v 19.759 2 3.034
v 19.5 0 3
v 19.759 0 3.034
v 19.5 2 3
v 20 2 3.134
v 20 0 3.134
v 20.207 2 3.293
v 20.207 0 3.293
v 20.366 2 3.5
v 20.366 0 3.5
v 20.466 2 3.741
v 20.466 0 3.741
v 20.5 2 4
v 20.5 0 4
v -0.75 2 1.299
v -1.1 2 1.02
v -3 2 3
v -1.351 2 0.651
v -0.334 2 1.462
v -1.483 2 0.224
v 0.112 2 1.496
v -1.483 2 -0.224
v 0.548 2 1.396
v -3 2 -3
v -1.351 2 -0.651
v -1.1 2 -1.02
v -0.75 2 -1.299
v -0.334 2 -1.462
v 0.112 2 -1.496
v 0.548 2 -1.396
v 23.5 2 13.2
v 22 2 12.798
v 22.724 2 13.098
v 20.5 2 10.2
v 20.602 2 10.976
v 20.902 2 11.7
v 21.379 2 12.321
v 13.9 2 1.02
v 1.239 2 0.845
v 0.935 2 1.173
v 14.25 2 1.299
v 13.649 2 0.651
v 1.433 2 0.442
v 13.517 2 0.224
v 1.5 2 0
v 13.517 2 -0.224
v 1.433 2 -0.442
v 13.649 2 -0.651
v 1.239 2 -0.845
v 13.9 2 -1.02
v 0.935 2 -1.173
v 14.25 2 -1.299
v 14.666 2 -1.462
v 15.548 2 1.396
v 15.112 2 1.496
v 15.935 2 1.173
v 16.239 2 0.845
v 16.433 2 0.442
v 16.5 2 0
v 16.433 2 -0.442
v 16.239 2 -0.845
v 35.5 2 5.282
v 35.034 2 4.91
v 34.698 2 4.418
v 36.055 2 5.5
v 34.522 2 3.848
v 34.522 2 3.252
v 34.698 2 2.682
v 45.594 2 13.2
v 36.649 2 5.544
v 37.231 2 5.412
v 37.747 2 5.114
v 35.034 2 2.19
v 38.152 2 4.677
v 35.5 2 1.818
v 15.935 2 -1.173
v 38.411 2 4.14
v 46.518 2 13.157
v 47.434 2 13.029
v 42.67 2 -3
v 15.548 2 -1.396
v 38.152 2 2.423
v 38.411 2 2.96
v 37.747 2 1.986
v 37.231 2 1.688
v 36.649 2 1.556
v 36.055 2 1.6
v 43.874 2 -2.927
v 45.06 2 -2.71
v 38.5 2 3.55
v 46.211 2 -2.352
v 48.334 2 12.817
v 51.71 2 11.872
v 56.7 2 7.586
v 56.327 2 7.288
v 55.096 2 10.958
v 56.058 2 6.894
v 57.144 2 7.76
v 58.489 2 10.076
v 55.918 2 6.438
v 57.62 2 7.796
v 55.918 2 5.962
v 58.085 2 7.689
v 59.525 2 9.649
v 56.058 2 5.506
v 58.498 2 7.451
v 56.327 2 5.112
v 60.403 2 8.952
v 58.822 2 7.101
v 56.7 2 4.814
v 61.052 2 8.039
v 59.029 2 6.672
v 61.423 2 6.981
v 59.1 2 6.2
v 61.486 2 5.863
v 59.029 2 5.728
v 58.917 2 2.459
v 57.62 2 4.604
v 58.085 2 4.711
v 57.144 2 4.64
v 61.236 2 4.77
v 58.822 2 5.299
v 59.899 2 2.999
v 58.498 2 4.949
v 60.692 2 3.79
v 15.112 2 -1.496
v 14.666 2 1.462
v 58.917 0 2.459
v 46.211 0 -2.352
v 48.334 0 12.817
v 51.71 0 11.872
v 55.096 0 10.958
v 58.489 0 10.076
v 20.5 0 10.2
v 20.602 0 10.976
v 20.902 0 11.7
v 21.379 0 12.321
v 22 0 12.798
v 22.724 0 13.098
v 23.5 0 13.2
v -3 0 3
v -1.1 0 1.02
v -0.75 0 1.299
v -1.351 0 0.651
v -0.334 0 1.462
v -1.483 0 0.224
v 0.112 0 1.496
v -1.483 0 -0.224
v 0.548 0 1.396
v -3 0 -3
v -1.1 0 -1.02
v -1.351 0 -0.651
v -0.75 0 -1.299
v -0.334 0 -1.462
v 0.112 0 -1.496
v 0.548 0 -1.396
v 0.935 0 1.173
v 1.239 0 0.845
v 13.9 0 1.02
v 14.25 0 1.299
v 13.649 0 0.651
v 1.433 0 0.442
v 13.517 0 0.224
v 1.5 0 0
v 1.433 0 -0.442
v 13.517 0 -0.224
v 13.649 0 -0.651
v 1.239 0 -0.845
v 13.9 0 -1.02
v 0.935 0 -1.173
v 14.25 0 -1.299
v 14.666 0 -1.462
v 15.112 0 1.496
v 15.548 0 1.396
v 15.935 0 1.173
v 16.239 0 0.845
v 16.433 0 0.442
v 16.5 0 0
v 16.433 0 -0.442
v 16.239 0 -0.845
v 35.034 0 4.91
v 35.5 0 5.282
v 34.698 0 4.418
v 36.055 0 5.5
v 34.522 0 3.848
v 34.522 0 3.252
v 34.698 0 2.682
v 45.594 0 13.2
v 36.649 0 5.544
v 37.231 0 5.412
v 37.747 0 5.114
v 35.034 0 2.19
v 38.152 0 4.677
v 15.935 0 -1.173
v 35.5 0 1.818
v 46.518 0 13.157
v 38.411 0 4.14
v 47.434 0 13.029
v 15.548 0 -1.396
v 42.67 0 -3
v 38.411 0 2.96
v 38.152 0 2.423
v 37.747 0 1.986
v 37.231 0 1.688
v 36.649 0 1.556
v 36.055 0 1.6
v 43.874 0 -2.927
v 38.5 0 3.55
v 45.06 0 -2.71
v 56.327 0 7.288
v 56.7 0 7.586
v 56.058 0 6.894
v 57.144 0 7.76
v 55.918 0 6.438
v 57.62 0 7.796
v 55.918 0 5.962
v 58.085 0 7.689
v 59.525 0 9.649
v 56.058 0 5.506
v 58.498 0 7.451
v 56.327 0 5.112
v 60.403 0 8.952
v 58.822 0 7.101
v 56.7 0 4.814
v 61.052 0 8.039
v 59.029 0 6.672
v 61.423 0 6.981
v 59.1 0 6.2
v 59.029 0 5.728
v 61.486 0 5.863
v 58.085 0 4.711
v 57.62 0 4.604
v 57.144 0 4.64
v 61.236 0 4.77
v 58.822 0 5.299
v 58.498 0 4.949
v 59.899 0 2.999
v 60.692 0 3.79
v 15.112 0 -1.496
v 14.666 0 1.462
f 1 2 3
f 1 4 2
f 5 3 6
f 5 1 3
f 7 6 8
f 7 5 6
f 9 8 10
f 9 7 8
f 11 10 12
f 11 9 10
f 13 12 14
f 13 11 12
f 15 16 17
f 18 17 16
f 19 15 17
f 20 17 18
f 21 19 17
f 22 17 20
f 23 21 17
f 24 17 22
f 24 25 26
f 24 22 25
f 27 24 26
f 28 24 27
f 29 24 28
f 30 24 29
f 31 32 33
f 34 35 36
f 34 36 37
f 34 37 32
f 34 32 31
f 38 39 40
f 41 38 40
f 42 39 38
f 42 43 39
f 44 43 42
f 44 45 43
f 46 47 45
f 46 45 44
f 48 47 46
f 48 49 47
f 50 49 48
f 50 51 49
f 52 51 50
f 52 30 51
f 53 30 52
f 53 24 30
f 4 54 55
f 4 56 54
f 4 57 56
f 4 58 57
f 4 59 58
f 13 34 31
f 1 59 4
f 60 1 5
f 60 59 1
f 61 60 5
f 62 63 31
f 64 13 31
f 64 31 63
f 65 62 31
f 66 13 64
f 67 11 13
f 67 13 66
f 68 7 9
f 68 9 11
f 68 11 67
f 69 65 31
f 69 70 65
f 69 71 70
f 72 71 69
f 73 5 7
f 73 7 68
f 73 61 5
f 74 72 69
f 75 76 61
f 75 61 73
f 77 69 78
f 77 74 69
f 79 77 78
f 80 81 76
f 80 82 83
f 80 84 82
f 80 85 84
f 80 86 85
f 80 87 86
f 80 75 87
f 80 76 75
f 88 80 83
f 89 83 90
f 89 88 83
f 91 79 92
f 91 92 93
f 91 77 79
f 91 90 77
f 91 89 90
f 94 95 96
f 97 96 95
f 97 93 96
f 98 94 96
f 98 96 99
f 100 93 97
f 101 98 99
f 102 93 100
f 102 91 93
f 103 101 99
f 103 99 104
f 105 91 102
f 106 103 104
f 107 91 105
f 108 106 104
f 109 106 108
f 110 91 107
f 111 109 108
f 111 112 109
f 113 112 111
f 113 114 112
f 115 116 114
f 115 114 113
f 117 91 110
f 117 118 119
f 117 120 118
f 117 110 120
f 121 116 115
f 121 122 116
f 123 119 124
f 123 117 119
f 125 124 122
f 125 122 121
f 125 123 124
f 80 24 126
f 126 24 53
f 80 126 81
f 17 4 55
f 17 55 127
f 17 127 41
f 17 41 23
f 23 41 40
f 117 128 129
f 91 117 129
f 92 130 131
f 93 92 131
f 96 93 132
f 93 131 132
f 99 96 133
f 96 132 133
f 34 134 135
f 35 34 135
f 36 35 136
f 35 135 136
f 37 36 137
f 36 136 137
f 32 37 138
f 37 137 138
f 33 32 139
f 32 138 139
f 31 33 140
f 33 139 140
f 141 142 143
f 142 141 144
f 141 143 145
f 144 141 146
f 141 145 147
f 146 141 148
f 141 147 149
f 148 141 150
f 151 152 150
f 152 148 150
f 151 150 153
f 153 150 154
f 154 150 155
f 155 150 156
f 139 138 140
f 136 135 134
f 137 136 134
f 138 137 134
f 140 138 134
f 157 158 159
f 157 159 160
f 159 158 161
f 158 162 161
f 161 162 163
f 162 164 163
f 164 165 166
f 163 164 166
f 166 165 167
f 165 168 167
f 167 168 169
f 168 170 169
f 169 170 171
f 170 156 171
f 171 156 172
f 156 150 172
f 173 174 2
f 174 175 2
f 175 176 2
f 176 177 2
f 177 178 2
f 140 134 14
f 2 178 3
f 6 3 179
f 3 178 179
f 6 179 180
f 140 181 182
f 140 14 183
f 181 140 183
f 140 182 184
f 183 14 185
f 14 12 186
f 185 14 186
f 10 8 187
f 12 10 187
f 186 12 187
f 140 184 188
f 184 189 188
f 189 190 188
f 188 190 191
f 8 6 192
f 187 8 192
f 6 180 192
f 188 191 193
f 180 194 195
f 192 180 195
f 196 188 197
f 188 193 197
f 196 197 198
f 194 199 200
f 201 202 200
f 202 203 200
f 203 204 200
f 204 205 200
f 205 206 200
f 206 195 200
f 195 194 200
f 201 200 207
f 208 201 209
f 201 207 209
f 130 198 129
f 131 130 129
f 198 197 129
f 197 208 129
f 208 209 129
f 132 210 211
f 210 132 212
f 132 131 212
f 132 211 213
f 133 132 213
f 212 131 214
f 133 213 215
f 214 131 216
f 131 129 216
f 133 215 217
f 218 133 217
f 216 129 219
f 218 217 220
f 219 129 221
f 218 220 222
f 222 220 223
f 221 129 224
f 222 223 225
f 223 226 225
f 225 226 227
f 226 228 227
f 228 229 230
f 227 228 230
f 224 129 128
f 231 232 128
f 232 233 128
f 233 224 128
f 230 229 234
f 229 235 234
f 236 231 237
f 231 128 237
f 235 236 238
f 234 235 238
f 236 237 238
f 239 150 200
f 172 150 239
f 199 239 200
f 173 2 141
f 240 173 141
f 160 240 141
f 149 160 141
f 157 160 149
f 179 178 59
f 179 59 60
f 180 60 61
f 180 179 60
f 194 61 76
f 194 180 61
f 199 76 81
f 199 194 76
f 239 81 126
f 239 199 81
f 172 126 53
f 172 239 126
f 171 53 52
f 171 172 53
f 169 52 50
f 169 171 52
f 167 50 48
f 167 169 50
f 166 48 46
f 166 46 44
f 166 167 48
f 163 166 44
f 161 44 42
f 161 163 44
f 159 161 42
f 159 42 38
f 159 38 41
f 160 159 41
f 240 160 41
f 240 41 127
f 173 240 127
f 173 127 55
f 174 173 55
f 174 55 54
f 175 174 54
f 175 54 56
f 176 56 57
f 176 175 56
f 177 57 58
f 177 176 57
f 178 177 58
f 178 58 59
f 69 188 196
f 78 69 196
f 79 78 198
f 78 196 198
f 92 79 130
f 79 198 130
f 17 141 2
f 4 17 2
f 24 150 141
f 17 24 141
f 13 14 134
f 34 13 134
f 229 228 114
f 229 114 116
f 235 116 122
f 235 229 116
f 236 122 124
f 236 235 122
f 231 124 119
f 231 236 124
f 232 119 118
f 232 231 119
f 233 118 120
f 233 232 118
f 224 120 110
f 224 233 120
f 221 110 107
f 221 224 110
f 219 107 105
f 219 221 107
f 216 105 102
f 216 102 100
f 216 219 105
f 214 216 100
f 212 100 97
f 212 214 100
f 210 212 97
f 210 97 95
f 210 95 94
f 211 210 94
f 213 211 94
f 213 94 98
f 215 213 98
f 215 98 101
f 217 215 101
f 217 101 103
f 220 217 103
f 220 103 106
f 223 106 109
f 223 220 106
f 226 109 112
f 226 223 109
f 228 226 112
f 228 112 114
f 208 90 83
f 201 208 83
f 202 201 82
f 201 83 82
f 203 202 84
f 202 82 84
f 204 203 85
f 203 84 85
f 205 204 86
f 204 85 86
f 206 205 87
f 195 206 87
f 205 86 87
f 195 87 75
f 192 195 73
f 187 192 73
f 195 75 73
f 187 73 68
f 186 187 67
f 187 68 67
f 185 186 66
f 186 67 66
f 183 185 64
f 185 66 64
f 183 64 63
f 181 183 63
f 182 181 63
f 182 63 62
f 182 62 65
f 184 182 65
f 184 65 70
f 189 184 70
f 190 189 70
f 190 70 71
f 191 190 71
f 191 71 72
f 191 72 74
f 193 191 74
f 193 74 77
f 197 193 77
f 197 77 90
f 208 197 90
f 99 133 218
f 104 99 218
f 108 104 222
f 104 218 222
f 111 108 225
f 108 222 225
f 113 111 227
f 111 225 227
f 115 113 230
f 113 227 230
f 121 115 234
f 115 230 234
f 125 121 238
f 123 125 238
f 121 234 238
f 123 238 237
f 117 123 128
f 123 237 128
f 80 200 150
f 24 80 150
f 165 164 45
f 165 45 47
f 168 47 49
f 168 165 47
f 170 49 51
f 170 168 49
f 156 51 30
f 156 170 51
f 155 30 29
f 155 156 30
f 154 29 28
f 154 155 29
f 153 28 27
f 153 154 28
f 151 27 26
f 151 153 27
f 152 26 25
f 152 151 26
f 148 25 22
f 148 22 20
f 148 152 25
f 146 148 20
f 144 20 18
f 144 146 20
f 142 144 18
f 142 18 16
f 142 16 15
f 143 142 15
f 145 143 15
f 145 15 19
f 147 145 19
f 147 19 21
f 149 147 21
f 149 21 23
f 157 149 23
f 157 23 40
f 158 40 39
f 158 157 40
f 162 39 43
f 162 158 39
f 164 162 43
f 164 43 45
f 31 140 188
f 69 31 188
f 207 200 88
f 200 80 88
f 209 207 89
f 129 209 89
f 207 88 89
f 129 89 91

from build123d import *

# Parameters (mm, degrees)
SKETCH_2_R          = 1.5
SKETCH_2_R_2        = 1.6
EXTRUDE_2_DEPTH     = 2
FILLET_1_R          = 1
FILLET_2_R          = 10
SKETCH_3_R          = 2
CUT_EXTRUDE_1_DEPTH = 3


with BuildPart() as part:
    # 草图2 → 凸台-拉伸2 (new body)
    with BuildSketch(Plane(origin=(0, 0, 0), x_dir=(1, 0, 0), z_dir=(0, 1, 0))):
        with BuildLine():
            Line((44.5, 3), (-3, 3))
            Line((-3, 3), (-3, -3))
            Line((-3, -3), (20.5, -3))
            Line((20.5, -3), (20.5, -10.2))
            ThreePointArc((20.5, -10.2), (21.378679656, -12.321320344), (23.5, -13.2))
            Line((23.5, -13.2), (45.594157258, -13.2))
            ThreePointArc((45.594157258, -13.2), (46.977327515, -13.10388005), (48.333907722, -12.817368008))
            ThreePointArc((48.333907722, -12.817368008), (53.401969584, -11.411447703), (58.489004431, -10.075805753))
            ThreePointArc((58.489004431, -10.075805753), (61.493712967, -6.424180145), (58.916547929, -2.459225753))
            Line((58.916547929, -2.459225753), (44.5, 3))
        make_face()
        Circle(SKETCH_2_R, mode=Mode.SUBTRACT)
        with Locations((15, 0)):
            Circle(SKETCH_2_R, mode=Mode.SUBTRACT)
        with Locations((57.5, -6.2)):
            Circle(SKETCH_2_R_2, mode=Mode.SUBTRACT)
    extrude(amount=EXTRUDE_2_DEPTH)

    # 圆角1
    fillet_1_edges = [part.edges().sort_by_distance(p)[0] for p in [
        (20.5, 1, 3),
    ]]
    fillet(fillet_1_edges, radius=FILLET_1_R)

    # 圆角2
    fillet_2_edges = [part.edges().sort_by_distance(p)[0] for p in [
        (44.5, 1, -3),
    ]]
    fillet(fillet_2_edges, radius=FILLET_2_R)

    # 草图3 → 切除-拉伸1 (cut, through all)
    with BuildSketch(Plane(origin=(0, 2, 0), x_dir=(1, 0, 0), z_dir=(0, 1, 0))):
        with Locations((36.5, -3.55)):
            Circle(SKETCH_3_R)
    extrude(amount=-CUT_EXTRUDE_1_DEPTH, mode=Mode.SUBTRACT)


solid = part.part
